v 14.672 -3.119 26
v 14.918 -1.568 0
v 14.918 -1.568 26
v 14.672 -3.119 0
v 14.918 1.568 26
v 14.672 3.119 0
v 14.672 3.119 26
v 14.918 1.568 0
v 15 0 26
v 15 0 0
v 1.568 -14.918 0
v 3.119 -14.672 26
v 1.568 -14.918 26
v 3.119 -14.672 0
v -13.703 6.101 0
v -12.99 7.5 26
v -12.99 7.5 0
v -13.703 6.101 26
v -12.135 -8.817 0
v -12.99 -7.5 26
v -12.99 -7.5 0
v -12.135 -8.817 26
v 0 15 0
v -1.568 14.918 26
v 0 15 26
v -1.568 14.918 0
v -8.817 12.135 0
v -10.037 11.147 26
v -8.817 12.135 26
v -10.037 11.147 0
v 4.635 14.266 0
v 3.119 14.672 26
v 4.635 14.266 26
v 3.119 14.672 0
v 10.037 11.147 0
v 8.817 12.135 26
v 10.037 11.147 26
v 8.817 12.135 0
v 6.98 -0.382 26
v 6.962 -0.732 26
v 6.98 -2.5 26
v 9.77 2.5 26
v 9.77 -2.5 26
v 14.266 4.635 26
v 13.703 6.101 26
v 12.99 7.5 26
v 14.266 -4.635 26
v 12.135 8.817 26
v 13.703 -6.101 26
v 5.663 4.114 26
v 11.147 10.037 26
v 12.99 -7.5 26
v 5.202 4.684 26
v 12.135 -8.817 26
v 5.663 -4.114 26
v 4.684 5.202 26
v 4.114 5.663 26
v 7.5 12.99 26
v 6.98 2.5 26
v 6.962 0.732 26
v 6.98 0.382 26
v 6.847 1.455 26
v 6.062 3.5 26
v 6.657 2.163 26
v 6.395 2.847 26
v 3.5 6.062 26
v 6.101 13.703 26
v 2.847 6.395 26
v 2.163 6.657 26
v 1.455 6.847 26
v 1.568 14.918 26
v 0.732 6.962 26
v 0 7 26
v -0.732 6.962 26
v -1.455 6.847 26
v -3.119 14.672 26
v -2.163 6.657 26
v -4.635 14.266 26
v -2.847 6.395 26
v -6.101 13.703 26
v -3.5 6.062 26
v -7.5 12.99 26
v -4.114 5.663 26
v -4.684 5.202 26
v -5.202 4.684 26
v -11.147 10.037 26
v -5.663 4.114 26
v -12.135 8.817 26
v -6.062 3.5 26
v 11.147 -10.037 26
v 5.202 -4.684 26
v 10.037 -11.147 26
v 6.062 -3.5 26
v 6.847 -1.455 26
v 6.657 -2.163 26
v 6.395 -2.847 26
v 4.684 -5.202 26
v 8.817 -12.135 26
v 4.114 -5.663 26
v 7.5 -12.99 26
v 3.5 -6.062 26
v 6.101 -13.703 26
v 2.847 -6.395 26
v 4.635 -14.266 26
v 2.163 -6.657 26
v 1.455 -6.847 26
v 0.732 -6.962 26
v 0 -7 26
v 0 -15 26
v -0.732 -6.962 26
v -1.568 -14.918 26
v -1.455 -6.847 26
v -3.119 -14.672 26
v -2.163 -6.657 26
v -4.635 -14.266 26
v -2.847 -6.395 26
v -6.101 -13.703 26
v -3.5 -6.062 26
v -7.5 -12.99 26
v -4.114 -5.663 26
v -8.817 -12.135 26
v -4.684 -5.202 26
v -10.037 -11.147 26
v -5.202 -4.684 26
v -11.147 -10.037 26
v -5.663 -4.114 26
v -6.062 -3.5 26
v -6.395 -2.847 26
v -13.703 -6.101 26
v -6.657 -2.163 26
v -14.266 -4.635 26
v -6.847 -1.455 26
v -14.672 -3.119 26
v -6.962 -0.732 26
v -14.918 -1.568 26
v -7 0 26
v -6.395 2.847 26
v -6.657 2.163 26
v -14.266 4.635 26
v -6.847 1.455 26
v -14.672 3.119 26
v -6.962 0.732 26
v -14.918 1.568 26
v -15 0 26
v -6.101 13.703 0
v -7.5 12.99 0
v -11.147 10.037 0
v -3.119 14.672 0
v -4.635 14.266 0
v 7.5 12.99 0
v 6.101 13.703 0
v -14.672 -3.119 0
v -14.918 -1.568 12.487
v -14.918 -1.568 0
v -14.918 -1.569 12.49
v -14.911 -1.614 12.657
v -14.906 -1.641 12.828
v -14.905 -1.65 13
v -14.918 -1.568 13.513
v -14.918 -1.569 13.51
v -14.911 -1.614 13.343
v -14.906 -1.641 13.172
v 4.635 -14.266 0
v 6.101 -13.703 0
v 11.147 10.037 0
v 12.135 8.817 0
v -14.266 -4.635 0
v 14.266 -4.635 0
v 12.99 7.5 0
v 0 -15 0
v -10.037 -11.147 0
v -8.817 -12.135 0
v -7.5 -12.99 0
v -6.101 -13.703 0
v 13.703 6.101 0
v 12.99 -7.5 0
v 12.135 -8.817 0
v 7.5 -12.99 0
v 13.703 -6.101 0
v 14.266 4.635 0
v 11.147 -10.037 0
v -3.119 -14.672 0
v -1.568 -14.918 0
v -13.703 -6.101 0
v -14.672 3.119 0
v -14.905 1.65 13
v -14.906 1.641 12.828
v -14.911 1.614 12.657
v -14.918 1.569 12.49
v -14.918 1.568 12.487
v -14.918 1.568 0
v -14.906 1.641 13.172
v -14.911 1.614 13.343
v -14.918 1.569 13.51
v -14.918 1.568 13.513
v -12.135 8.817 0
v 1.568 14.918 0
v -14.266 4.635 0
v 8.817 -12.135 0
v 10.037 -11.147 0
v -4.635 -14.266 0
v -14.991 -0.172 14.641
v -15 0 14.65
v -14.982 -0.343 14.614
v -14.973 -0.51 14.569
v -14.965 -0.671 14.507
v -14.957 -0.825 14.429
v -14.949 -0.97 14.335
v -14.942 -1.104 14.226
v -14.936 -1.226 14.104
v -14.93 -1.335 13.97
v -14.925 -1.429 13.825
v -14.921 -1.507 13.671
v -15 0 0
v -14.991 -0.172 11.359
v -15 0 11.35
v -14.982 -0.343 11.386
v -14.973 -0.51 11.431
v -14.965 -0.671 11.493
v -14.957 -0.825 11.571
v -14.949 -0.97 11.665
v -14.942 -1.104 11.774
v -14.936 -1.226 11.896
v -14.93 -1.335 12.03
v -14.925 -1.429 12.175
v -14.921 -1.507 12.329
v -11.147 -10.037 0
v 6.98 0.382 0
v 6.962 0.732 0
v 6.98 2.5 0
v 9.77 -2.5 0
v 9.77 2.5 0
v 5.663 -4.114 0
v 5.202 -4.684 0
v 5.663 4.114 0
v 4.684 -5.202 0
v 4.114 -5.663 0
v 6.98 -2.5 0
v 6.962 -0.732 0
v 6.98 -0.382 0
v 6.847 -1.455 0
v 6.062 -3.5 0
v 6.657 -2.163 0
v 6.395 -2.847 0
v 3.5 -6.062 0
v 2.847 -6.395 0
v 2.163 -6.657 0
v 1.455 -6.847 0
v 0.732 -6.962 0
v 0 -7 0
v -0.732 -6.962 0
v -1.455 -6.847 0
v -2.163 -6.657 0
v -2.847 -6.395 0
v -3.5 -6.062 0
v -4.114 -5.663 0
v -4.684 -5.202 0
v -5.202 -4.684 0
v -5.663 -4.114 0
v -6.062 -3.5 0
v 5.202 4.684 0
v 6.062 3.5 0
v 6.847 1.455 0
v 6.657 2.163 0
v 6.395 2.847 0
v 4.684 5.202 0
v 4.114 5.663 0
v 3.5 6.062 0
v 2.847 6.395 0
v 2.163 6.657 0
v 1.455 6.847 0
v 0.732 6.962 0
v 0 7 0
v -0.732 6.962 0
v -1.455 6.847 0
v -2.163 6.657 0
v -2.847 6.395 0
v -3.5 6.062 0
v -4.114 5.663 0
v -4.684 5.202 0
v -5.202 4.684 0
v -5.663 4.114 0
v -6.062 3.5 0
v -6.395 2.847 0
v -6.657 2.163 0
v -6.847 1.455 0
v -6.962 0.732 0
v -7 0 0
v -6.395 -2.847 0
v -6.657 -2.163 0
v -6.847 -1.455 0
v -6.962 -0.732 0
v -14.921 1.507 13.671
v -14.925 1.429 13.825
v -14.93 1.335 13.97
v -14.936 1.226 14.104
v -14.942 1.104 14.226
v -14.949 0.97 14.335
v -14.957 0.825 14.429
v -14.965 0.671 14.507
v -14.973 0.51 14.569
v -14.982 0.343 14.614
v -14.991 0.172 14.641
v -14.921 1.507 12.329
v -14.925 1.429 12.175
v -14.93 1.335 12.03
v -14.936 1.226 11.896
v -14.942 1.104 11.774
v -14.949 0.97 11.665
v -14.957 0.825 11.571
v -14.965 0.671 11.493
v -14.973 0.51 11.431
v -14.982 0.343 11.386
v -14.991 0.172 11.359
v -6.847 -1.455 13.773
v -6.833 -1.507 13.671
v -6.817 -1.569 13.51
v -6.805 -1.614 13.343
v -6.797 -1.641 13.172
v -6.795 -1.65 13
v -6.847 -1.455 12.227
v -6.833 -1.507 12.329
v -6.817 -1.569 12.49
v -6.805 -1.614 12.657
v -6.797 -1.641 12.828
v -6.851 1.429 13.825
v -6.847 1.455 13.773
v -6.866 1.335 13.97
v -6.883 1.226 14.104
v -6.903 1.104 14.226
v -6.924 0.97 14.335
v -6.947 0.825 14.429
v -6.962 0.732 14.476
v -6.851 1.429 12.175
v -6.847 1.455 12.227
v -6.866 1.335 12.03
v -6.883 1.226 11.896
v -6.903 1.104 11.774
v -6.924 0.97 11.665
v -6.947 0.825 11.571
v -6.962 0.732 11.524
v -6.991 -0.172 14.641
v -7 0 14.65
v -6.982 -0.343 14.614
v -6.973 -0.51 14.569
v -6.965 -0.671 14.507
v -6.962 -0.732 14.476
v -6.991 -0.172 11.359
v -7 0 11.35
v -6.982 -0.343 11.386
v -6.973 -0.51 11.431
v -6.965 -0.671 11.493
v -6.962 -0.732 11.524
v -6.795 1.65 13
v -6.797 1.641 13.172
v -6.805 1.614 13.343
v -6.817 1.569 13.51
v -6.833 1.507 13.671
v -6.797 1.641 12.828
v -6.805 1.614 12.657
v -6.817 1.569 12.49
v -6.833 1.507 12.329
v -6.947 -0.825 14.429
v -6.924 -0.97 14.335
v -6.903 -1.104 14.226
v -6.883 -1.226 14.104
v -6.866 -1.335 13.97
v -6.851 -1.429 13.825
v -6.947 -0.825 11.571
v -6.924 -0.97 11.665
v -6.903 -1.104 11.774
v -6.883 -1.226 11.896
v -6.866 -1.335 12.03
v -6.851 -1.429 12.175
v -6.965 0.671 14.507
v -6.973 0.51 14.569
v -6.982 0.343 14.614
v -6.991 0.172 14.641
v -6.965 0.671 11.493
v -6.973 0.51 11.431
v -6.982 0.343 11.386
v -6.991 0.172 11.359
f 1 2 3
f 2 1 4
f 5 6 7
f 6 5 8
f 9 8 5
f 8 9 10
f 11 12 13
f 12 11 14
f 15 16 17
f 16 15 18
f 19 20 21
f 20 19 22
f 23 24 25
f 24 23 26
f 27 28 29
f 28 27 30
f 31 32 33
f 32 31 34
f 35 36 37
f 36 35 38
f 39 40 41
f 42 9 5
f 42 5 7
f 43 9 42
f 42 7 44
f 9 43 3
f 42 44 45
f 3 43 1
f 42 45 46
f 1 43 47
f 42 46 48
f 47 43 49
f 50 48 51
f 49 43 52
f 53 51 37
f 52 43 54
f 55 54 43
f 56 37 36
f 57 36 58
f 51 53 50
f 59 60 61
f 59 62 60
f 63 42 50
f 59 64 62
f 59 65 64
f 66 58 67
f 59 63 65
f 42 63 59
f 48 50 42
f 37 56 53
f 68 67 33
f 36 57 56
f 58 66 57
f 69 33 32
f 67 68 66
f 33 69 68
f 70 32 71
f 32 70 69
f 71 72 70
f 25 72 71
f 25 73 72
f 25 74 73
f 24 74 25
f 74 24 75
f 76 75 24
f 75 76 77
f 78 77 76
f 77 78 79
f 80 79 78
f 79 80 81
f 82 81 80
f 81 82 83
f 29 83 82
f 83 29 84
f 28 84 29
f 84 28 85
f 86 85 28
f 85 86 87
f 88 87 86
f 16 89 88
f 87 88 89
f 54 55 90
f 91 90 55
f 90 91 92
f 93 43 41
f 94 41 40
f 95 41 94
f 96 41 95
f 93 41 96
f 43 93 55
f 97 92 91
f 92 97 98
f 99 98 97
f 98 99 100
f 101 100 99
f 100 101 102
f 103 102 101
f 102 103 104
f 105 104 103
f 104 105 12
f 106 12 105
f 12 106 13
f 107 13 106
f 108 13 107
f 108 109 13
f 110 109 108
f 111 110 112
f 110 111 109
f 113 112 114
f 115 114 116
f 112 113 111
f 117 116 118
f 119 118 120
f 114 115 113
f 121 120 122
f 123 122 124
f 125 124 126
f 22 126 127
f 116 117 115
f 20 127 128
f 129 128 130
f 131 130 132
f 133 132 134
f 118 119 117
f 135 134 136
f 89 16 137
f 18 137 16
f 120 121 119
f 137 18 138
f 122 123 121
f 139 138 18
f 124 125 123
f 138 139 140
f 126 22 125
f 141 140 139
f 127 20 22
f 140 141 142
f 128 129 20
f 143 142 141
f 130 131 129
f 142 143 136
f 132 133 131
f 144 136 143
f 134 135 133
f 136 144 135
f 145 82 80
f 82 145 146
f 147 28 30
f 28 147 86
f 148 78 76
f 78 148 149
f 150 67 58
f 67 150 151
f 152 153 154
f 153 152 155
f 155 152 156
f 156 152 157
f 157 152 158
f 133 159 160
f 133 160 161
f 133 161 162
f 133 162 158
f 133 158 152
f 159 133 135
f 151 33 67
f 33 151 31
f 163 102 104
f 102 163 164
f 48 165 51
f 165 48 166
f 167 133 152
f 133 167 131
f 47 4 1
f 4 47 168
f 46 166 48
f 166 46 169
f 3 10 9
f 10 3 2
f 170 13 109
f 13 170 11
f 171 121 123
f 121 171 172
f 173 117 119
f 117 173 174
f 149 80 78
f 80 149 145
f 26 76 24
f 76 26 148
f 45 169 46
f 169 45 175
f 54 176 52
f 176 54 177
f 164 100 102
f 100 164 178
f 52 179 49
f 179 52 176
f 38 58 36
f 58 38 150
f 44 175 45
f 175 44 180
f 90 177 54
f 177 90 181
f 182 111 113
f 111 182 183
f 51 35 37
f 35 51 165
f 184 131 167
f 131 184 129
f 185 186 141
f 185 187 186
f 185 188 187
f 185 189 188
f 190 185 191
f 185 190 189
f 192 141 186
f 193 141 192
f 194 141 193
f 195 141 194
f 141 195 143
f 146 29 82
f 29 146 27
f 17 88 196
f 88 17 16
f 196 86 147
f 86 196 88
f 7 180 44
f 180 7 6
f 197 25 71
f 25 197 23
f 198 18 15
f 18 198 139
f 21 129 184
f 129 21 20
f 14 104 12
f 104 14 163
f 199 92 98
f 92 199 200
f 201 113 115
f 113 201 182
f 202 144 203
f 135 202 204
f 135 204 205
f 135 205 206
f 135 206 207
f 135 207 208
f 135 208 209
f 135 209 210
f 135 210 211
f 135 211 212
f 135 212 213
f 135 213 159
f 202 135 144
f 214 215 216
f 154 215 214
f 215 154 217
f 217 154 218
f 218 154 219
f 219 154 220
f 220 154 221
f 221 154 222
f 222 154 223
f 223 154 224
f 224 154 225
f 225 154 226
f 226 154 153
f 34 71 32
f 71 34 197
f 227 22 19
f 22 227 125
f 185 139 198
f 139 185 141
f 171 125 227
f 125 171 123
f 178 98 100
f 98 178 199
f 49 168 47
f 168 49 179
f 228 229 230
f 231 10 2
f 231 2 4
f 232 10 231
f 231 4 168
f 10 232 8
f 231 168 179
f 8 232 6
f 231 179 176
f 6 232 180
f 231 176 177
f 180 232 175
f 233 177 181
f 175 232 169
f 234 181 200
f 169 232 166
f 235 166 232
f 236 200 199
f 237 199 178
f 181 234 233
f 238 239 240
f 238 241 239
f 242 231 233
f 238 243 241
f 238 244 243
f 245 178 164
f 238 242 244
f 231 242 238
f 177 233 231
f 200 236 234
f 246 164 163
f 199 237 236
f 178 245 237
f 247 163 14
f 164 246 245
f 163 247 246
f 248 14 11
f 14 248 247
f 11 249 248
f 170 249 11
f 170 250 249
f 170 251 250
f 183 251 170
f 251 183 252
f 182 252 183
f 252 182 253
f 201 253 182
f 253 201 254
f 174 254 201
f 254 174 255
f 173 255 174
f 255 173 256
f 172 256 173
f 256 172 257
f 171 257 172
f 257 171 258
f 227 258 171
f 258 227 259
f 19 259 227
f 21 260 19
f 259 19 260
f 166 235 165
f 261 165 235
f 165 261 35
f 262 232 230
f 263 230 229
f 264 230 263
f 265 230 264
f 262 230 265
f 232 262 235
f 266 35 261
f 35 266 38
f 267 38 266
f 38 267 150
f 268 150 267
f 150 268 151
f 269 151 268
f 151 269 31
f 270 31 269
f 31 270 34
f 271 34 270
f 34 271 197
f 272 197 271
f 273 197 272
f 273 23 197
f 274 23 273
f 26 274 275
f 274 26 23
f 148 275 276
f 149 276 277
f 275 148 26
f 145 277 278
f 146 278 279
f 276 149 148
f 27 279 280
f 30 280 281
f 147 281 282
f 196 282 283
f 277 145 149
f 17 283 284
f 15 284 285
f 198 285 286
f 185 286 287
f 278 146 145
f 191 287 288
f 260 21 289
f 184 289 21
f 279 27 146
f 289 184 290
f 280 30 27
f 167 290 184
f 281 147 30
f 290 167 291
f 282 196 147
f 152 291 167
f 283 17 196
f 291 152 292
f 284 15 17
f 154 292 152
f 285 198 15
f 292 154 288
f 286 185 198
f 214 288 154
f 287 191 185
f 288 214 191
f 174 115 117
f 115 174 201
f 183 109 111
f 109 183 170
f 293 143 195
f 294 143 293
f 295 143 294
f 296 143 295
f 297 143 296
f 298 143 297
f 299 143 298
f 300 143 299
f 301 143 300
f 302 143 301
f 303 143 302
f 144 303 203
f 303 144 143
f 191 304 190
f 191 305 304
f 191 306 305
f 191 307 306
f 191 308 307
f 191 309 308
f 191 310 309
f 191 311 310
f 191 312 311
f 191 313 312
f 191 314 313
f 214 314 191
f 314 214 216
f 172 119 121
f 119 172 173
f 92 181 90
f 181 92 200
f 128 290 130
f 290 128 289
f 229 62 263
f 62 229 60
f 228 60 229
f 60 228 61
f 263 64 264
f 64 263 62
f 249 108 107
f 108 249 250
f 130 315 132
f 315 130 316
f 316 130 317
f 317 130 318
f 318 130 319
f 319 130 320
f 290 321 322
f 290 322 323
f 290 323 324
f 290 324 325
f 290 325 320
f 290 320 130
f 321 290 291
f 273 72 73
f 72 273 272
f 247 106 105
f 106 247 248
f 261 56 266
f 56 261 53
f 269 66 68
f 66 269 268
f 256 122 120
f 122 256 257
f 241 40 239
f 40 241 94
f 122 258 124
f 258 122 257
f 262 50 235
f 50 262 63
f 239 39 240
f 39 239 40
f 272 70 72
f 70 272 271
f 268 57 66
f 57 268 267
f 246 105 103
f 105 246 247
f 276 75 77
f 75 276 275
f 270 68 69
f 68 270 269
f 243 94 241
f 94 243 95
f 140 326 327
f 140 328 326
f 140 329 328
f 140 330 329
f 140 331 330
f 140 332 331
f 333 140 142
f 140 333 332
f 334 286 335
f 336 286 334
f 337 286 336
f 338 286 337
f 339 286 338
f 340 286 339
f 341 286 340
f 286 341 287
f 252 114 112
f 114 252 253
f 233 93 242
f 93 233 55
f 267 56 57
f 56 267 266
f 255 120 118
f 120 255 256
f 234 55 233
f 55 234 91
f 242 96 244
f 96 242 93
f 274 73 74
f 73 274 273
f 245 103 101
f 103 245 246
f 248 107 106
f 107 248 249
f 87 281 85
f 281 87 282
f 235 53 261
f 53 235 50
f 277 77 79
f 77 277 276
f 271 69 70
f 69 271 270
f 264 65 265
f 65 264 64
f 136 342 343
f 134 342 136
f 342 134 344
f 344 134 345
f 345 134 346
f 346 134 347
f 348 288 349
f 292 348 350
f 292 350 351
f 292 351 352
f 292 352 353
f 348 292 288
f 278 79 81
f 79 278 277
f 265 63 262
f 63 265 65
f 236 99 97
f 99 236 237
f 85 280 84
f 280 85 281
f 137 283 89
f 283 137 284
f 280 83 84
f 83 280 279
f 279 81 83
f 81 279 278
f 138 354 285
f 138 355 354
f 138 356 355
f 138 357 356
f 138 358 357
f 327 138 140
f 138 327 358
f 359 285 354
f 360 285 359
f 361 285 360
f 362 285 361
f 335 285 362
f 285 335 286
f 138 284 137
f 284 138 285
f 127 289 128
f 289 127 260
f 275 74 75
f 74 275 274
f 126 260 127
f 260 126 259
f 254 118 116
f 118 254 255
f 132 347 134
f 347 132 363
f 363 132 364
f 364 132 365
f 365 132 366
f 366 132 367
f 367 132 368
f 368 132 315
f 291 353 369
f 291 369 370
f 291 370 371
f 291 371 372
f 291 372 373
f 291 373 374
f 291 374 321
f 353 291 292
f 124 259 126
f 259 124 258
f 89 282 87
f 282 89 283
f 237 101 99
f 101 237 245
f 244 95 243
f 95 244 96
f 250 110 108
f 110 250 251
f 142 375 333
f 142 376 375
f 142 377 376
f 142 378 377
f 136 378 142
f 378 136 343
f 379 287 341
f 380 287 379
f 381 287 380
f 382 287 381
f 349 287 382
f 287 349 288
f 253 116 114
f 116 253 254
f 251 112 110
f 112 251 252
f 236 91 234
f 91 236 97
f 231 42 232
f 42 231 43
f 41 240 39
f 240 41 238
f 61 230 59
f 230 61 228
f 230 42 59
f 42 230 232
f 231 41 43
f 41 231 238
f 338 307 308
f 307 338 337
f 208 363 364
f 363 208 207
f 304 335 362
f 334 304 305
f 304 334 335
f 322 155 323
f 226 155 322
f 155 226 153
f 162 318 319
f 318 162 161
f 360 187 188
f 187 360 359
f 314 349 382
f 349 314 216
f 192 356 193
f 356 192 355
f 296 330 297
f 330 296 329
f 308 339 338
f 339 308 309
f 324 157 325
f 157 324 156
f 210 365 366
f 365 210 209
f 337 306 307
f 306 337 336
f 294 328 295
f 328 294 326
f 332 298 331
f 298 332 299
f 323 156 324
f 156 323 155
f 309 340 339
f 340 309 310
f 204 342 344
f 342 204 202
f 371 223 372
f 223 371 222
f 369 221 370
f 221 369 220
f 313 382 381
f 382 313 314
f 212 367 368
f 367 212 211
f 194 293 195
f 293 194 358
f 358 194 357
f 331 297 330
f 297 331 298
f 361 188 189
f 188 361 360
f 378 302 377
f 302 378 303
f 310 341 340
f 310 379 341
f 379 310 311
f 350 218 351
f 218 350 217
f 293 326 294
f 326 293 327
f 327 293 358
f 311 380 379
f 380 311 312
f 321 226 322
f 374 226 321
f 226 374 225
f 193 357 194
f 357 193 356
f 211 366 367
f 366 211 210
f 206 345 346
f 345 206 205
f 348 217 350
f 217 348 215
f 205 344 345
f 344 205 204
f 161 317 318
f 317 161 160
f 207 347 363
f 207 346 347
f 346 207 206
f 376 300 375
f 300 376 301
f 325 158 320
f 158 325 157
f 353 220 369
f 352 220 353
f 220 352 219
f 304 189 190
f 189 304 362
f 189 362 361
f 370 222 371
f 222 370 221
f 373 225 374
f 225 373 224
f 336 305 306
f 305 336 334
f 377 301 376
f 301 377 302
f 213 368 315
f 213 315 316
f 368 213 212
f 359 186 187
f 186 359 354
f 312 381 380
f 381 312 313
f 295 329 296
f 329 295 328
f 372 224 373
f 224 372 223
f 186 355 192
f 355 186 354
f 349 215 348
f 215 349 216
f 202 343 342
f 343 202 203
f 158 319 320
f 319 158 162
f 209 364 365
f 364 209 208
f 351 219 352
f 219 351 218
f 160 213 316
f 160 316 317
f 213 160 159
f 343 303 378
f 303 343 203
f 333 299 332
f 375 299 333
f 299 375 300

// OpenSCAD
// Keyway hub for a 14 mm shaft.
$fn = 60;
eps = 0.02;
shaft_d = 14;
outer_d = 30;
length = 26;
key_w = 5;
key_depth = 2.75;
difference() {
    cylinder(d = outer_d, h = length);
    translate([0, 0, -eps]) cylinder(d = shaft_d, h = length + 2 * eps);
    translate([shaft_d / 2 - eps, -key_w / 2, -eps]) cube([key_depth + 2 * eps, key_w, length + 2 * eps]);
    translate([-outer_d / 2 - eps, 0, length / 2]) rotate([0, 90, 0]) cylinder(d = 3.3, h = outer_d / 2 + 2 * eps);
}
